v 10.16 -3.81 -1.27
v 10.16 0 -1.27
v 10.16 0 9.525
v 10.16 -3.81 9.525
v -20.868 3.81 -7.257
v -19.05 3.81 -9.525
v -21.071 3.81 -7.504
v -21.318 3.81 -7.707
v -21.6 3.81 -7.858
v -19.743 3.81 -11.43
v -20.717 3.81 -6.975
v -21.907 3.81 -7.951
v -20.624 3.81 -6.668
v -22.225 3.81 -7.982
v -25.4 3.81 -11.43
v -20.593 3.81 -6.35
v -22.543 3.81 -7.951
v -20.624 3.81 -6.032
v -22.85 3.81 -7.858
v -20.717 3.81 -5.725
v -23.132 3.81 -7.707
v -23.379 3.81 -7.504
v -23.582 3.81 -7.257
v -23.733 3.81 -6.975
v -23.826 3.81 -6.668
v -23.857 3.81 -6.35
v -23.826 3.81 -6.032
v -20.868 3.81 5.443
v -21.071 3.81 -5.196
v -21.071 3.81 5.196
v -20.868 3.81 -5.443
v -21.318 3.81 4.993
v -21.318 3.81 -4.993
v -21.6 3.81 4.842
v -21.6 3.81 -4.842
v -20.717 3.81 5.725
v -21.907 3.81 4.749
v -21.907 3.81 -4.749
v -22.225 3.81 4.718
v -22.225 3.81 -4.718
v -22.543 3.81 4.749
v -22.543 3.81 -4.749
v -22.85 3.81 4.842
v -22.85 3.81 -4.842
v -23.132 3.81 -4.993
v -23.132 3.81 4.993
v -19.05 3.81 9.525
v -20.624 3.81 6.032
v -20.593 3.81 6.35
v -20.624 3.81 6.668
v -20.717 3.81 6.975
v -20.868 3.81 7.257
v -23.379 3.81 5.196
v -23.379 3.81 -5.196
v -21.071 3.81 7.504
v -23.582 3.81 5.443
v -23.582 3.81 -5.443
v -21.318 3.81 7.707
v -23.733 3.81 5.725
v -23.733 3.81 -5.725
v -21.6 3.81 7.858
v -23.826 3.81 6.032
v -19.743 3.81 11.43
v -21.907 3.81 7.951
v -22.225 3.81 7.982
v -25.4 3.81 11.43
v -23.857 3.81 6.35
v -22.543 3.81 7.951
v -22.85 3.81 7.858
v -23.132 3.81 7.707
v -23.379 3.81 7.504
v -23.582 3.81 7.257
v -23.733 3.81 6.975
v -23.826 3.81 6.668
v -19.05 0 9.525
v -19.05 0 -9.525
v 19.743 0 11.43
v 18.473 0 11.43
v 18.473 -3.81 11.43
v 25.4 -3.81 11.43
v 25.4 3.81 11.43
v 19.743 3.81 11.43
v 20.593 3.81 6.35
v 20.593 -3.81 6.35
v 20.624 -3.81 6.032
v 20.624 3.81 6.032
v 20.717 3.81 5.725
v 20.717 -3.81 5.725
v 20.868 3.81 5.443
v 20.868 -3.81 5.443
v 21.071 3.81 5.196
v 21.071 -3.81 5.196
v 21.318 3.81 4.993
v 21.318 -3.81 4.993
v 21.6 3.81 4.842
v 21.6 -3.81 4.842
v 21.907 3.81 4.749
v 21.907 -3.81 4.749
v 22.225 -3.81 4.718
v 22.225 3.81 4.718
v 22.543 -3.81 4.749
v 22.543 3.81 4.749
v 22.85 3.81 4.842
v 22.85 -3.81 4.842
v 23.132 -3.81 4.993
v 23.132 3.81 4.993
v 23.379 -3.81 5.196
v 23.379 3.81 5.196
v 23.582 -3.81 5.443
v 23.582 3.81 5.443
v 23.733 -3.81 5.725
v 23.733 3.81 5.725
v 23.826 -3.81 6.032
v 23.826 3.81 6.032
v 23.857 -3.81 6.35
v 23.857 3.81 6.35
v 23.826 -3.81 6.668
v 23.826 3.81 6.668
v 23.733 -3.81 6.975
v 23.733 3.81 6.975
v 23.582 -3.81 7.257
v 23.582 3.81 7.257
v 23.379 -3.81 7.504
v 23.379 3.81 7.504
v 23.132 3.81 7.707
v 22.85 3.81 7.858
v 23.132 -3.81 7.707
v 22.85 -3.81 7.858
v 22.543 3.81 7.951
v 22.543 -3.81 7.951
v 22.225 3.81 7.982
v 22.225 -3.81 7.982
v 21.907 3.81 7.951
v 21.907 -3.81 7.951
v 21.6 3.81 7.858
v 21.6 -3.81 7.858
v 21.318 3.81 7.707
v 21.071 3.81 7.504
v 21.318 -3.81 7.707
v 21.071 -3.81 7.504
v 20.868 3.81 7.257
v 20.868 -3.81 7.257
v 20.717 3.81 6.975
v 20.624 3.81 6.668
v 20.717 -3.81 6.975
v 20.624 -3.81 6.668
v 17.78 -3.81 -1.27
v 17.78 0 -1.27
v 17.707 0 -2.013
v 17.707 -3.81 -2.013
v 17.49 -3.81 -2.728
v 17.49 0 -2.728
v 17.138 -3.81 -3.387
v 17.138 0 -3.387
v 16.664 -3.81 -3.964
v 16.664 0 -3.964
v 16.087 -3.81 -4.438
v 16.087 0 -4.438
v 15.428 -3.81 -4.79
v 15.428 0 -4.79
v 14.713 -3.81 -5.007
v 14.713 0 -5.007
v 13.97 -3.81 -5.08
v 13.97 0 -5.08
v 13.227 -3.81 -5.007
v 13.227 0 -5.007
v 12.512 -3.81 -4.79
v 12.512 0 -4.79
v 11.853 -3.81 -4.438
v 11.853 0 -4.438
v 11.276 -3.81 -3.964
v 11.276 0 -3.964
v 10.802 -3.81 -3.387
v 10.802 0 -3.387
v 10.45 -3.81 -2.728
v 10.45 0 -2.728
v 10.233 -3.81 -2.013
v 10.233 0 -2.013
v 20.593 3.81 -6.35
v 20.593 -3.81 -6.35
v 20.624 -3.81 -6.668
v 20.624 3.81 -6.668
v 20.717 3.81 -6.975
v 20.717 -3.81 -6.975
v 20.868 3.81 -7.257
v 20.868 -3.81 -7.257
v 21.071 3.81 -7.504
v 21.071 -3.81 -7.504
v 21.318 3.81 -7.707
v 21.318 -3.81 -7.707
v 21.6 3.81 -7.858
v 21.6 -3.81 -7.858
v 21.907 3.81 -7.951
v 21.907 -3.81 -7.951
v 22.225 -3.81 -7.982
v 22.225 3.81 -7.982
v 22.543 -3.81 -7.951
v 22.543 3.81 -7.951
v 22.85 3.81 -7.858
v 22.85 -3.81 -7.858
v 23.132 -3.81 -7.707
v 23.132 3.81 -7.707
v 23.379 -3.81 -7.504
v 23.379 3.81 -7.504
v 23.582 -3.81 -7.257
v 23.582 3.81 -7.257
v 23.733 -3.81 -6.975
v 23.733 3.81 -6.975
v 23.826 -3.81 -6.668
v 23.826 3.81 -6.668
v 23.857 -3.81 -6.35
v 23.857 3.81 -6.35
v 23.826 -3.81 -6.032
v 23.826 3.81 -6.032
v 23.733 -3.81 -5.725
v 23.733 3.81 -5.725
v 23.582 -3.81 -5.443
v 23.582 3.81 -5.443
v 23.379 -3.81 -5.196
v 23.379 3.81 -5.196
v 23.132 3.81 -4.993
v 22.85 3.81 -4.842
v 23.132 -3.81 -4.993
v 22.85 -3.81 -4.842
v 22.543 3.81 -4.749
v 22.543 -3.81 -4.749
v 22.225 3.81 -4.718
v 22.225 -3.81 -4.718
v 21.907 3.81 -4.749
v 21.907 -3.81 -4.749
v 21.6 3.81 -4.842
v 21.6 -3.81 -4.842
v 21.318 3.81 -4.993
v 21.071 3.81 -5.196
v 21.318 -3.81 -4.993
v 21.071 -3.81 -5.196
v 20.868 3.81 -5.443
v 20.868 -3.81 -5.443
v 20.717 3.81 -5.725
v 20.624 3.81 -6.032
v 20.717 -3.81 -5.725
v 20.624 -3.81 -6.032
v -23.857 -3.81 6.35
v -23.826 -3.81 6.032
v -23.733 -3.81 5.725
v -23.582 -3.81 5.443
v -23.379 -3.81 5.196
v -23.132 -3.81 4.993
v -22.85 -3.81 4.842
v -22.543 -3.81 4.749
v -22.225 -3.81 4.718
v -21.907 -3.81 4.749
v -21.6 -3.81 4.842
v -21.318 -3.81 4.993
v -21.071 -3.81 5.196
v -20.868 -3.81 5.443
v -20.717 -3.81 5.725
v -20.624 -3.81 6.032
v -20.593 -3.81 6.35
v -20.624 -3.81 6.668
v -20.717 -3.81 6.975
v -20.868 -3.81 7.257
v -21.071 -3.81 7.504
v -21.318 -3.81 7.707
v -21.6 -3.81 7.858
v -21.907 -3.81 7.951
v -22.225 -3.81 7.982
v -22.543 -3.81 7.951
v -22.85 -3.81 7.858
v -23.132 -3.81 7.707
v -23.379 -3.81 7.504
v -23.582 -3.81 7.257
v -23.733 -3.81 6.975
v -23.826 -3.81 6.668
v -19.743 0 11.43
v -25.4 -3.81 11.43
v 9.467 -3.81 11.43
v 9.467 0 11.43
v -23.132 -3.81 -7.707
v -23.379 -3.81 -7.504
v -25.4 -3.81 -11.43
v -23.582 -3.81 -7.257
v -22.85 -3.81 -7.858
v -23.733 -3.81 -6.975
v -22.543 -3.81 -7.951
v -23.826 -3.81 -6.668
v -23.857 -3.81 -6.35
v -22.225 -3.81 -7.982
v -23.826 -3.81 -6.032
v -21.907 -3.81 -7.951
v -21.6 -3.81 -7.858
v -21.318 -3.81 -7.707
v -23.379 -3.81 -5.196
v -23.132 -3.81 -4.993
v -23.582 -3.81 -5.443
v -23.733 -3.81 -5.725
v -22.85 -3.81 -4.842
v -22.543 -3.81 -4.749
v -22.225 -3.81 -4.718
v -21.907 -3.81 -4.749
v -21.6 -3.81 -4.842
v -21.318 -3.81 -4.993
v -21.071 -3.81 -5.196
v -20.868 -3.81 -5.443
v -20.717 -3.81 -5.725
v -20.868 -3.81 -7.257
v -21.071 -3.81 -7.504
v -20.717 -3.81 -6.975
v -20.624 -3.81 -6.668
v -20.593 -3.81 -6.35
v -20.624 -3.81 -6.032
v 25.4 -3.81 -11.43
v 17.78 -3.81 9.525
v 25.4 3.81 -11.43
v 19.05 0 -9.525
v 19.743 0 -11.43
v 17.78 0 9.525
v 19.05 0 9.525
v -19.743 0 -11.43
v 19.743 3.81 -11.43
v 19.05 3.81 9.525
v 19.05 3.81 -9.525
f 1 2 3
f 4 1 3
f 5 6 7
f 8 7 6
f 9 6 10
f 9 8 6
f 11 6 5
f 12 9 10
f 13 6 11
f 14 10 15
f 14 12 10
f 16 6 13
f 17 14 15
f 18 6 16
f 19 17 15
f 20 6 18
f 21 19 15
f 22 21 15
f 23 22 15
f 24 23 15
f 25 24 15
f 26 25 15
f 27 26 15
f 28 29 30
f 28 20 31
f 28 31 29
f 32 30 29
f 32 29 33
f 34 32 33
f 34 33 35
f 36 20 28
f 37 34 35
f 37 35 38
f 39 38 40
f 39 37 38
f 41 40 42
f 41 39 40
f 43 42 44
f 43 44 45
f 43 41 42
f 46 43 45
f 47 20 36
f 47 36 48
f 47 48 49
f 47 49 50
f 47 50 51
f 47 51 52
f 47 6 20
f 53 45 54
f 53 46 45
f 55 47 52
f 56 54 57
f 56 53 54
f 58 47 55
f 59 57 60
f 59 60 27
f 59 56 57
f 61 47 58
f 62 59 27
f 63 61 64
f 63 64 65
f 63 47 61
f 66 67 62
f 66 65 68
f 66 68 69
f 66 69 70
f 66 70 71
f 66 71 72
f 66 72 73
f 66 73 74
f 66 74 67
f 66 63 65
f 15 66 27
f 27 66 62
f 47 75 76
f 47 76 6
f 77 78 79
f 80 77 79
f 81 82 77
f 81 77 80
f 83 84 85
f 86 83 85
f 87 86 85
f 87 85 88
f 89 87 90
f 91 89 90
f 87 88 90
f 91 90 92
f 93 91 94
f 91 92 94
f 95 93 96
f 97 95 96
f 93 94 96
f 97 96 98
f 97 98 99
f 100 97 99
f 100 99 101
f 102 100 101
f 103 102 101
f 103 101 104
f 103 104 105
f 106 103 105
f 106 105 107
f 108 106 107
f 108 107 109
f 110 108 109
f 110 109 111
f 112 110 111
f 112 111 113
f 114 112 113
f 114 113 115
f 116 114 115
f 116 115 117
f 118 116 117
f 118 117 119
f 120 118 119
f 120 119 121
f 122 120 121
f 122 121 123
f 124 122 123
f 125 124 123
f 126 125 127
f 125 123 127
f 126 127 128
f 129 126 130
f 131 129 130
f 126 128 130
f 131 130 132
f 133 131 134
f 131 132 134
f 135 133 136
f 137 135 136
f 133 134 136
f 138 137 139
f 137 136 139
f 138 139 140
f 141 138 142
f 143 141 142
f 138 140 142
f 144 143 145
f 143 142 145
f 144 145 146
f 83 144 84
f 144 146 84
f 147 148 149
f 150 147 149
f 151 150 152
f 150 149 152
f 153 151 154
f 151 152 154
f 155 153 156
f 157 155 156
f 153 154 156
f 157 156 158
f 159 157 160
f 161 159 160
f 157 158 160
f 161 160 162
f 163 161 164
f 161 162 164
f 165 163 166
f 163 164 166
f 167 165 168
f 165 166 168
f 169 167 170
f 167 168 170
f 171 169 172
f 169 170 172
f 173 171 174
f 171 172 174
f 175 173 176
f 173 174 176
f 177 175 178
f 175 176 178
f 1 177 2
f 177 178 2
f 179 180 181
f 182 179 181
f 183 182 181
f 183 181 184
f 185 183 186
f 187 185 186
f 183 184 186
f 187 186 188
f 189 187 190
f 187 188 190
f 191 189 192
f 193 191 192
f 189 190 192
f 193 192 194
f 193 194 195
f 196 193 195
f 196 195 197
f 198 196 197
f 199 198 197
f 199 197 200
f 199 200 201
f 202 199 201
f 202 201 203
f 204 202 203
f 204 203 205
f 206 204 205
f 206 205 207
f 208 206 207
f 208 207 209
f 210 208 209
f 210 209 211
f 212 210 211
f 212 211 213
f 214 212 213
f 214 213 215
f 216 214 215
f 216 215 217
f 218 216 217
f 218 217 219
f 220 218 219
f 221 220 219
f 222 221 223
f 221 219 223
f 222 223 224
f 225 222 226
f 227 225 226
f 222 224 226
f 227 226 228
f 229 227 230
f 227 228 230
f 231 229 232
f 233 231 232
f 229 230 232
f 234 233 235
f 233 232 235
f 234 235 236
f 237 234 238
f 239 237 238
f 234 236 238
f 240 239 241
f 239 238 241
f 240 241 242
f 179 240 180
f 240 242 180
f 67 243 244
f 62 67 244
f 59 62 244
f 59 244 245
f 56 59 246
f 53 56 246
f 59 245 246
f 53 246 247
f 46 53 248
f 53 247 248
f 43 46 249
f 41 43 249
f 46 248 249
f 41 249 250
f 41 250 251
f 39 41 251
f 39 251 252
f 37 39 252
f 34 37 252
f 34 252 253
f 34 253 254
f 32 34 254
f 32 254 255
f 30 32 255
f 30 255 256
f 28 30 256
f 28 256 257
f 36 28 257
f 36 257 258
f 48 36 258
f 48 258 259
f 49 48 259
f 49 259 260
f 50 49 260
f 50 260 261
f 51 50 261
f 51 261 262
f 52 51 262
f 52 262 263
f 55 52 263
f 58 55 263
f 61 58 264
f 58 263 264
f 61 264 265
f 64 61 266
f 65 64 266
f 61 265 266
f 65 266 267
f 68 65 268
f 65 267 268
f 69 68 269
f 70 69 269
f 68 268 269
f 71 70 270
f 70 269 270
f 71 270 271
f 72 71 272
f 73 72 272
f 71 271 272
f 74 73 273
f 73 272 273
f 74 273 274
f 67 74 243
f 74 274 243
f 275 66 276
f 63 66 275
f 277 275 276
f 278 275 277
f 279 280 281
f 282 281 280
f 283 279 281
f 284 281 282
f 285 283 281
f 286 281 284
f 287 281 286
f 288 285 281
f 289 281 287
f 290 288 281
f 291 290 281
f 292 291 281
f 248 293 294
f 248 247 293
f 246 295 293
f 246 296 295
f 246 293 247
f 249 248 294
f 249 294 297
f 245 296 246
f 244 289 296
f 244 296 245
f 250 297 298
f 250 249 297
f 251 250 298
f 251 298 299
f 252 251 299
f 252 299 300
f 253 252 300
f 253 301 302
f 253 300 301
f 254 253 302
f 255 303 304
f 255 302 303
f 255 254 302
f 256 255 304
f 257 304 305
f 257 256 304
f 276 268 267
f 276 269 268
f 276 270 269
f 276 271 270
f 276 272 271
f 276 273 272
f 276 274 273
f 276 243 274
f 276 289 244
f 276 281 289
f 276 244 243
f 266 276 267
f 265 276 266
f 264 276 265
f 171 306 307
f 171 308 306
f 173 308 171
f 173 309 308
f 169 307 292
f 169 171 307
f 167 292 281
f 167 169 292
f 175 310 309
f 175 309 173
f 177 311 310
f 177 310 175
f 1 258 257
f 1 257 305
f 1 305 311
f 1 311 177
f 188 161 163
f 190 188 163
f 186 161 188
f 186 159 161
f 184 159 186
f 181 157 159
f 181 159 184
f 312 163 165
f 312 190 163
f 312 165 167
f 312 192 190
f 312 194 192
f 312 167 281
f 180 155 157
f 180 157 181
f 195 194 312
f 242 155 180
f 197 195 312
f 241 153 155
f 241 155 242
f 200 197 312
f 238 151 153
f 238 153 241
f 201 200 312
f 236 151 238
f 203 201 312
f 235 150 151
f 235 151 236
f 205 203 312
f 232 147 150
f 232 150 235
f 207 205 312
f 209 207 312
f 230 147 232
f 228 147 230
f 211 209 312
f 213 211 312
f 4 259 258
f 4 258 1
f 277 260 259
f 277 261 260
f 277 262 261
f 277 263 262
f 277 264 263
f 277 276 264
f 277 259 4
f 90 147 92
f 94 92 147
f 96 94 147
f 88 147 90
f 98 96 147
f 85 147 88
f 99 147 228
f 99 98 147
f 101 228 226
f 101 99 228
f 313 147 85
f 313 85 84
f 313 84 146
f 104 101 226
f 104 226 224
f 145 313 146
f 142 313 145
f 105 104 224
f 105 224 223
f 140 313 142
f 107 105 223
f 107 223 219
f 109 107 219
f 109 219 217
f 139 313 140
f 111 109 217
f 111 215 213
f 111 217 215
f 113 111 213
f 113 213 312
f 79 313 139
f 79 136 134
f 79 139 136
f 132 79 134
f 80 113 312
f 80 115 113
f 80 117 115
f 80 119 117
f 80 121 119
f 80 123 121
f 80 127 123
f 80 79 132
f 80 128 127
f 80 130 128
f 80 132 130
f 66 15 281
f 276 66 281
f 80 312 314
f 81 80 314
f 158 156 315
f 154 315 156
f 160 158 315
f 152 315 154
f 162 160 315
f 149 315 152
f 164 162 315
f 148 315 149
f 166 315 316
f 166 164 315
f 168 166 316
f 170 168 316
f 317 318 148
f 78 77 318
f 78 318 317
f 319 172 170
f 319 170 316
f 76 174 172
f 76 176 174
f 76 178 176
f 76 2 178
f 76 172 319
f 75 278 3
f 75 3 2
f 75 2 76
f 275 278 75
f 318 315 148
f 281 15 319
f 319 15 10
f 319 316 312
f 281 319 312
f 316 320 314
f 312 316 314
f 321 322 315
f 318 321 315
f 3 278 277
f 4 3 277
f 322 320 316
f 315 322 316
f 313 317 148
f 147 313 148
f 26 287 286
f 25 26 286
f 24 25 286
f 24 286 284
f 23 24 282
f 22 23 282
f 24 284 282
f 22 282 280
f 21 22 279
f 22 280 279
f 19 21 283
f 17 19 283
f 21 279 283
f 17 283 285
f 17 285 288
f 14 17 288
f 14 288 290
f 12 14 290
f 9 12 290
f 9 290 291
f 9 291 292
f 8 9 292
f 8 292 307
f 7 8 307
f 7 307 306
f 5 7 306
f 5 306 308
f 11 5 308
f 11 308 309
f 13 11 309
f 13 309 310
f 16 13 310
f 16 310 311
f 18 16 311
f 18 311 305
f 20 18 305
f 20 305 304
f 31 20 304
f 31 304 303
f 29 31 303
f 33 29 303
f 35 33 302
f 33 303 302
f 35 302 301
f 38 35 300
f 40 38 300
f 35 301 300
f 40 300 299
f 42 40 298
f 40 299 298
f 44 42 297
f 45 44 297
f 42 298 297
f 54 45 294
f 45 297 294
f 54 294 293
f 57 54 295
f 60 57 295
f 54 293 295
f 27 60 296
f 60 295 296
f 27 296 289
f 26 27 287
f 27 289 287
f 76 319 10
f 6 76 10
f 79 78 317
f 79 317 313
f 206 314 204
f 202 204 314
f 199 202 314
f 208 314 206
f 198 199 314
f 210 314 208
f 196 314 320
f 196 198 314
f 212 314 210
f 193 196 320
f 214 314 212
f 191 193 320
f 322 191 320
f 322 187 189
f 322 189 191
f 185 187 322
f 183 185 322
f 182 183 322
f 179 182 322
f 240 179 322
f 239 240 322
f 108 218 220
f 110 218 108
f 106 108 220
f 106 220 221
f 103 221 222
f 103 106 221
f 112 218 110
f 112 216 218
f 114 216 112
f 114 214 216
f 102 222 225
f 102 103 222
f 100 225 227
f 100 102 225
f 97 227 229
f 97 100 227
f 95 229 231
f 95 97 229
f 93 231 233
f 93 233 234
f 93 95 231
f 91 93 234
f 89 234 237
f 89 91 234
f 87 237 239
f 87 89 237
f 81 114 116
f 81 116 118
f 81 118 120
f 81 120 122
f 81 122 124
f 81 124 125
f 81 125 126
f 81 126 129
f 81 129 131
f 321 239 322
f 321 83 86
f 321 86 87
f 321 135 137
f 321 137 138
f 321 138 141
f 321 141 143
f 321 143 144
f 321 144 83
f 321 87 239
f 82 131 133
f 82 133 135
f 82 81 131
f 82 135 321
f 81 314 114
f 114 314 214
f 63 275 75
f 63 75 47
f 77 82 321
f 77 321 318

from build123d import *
from OCP.BRepFilletAPI import BRepFilletAPI_MakeChamfer

# Parameters (mm, degrees)
BOSS_EXTRUDE1_DEPTH   = 11.43
F_4_CLEARANCE_HOLE1_D = 3.2639
CUT_EXTRUDE1_DEPTH    = 29.112648399
CHAMFER1_SIZE         = 1.905
CHAMFER1_SIZE2        = 0.693363296


with BuildPart() as part:
    # Sketch1 → Boss-Extrude1 (new, symmetric)
    with BuildSketch(Plane.XY):
        Polygon((-19.05, 3.81), (-25.4, 3.81), (-25.4, -3.81), (25.4, -3.81), (25.4, 3.81), (19.05, 3.81), (19.05, 0), (-19.05, 0), align=None)
    extrude(amount=BOSS_EXTRUDE1_DEPTH, both=True)

    # #4 Clearance Hole1 (through all)
    with Locations(Plane(origin=(0, 3.81, 0), x_dir=(1, 0, 0), z_dir=(0, 1, 0))):
        with Locations((22.225, -6.35), (-22.225, 6.35), (-22.225, -6.35), (22.225, 6.35)):
            Hole(F_4_CLEARANCE_HOLE1_D / 2)

    # Sketch4 → Cut-Extrude1 (cut, through all)
    with BuildSketch(Plane(origin=(0, 0, 0), x_dir=(1, 0, 0), z_dir=(0, 1, 0))):
        with BuildLine():
            Line((17.78, -11.43), (17.78, 1.27))
            ThreePointArc((17.78, 1.27), (13.97, 5.08), (10.16, 1.27))
            Line((10.16, 1.27), (10.16, -11.43))
            Line((10.16, -11.43), (17.78, -11.43))
        make_face()
    extrude(amount=-CUT_EXTRUDE1_DEPTH, mode=Mode.SUBTRACT)

    # Chamfer1: one chamfer whose edges measure the first distance from different faces: ONE call of the kernel's chamfer builder (chamfer() names one face for all edges)
    chamfer1_edges_1 = [part.edges().sort_by_distance(p)[0] for p in [
        (19.05, 1.905, 11.43),
        (19.05, 1.905, -11.43),
    ]]
    chamfer1_side_1 = [part.faces().sort_by_distance(p)[0] for p in [
        (19.05, 1.905, 0),
    ]]
    chamfer1_edges_2 = [part.edges().sort_by_distance(p)[0] for p in [
        (-19.05, 1.905, -11.43),
        (-19.05, 1.905, 11.43),
    ]]
    chamfer1_side_2 = [part.faces().sort_by_distance(p)[0] for p in [
        (-19.05, 1.905, 0),
    ]]
    chamfer1_edges_3 = [part.edges().sort_by_distance(p)[0] for p in [
        (17.78, -1.905, 11.43),
    ]]
    chamfer1_side_3 = [part.faces().sort_by_distance(p)[0] for p in [
        (17.78, -1.905, 5.08),
    ]]
    chamfer1_edges_4 = [part.edges().sort_by_distance(p)[0] for p in [
        (10.16, -1.905, 11.43),
    ]]
    chamfer1_side_4 = [part.faces().sort_by_distance(p)[0] for p in [
        (10.16, -1.905, 5.08),
    ]]
    chamfer1 = BRepFilletAPI_MakeChamfer(part.part.solid().wrapped)
    for e in chamfer1_edges_1:
        chamfer1.Add(CHAMFER1_SIZE, CHAMFER1_SIZE2, e.wrapped, chamfer1_side_1[0].wrapped)  # the first distance lies on this face
    for e in chamfer1_edges_2:
        chamfer1.Add(CHAMFER1_SIZE, CHAMFER1_SIZE2, e.wrapped, chamfer1_side_2[0].wrapped)  # the first distance lies on this face
    for e in chamfer1_edges_3:
        chamfer1.Add(CHAMFER1_SIZE, CHAMFER1_SIZE2, e.wrapped, chamfer1_side_3[0].wrapped)  # the first distance lies on this face
    for e in chamfer1_edges_4:
        chamfer1.Add(CHAMFER1_SIZE, CHAMFER1_SIZE2, e.wrapped, chamfer1_side_4[0].wrapped)  # the first distance lies on this face
    add(Compound.cast(chamfer1.Shape()), mode=Mode.REPLACE)


solid = part.part
